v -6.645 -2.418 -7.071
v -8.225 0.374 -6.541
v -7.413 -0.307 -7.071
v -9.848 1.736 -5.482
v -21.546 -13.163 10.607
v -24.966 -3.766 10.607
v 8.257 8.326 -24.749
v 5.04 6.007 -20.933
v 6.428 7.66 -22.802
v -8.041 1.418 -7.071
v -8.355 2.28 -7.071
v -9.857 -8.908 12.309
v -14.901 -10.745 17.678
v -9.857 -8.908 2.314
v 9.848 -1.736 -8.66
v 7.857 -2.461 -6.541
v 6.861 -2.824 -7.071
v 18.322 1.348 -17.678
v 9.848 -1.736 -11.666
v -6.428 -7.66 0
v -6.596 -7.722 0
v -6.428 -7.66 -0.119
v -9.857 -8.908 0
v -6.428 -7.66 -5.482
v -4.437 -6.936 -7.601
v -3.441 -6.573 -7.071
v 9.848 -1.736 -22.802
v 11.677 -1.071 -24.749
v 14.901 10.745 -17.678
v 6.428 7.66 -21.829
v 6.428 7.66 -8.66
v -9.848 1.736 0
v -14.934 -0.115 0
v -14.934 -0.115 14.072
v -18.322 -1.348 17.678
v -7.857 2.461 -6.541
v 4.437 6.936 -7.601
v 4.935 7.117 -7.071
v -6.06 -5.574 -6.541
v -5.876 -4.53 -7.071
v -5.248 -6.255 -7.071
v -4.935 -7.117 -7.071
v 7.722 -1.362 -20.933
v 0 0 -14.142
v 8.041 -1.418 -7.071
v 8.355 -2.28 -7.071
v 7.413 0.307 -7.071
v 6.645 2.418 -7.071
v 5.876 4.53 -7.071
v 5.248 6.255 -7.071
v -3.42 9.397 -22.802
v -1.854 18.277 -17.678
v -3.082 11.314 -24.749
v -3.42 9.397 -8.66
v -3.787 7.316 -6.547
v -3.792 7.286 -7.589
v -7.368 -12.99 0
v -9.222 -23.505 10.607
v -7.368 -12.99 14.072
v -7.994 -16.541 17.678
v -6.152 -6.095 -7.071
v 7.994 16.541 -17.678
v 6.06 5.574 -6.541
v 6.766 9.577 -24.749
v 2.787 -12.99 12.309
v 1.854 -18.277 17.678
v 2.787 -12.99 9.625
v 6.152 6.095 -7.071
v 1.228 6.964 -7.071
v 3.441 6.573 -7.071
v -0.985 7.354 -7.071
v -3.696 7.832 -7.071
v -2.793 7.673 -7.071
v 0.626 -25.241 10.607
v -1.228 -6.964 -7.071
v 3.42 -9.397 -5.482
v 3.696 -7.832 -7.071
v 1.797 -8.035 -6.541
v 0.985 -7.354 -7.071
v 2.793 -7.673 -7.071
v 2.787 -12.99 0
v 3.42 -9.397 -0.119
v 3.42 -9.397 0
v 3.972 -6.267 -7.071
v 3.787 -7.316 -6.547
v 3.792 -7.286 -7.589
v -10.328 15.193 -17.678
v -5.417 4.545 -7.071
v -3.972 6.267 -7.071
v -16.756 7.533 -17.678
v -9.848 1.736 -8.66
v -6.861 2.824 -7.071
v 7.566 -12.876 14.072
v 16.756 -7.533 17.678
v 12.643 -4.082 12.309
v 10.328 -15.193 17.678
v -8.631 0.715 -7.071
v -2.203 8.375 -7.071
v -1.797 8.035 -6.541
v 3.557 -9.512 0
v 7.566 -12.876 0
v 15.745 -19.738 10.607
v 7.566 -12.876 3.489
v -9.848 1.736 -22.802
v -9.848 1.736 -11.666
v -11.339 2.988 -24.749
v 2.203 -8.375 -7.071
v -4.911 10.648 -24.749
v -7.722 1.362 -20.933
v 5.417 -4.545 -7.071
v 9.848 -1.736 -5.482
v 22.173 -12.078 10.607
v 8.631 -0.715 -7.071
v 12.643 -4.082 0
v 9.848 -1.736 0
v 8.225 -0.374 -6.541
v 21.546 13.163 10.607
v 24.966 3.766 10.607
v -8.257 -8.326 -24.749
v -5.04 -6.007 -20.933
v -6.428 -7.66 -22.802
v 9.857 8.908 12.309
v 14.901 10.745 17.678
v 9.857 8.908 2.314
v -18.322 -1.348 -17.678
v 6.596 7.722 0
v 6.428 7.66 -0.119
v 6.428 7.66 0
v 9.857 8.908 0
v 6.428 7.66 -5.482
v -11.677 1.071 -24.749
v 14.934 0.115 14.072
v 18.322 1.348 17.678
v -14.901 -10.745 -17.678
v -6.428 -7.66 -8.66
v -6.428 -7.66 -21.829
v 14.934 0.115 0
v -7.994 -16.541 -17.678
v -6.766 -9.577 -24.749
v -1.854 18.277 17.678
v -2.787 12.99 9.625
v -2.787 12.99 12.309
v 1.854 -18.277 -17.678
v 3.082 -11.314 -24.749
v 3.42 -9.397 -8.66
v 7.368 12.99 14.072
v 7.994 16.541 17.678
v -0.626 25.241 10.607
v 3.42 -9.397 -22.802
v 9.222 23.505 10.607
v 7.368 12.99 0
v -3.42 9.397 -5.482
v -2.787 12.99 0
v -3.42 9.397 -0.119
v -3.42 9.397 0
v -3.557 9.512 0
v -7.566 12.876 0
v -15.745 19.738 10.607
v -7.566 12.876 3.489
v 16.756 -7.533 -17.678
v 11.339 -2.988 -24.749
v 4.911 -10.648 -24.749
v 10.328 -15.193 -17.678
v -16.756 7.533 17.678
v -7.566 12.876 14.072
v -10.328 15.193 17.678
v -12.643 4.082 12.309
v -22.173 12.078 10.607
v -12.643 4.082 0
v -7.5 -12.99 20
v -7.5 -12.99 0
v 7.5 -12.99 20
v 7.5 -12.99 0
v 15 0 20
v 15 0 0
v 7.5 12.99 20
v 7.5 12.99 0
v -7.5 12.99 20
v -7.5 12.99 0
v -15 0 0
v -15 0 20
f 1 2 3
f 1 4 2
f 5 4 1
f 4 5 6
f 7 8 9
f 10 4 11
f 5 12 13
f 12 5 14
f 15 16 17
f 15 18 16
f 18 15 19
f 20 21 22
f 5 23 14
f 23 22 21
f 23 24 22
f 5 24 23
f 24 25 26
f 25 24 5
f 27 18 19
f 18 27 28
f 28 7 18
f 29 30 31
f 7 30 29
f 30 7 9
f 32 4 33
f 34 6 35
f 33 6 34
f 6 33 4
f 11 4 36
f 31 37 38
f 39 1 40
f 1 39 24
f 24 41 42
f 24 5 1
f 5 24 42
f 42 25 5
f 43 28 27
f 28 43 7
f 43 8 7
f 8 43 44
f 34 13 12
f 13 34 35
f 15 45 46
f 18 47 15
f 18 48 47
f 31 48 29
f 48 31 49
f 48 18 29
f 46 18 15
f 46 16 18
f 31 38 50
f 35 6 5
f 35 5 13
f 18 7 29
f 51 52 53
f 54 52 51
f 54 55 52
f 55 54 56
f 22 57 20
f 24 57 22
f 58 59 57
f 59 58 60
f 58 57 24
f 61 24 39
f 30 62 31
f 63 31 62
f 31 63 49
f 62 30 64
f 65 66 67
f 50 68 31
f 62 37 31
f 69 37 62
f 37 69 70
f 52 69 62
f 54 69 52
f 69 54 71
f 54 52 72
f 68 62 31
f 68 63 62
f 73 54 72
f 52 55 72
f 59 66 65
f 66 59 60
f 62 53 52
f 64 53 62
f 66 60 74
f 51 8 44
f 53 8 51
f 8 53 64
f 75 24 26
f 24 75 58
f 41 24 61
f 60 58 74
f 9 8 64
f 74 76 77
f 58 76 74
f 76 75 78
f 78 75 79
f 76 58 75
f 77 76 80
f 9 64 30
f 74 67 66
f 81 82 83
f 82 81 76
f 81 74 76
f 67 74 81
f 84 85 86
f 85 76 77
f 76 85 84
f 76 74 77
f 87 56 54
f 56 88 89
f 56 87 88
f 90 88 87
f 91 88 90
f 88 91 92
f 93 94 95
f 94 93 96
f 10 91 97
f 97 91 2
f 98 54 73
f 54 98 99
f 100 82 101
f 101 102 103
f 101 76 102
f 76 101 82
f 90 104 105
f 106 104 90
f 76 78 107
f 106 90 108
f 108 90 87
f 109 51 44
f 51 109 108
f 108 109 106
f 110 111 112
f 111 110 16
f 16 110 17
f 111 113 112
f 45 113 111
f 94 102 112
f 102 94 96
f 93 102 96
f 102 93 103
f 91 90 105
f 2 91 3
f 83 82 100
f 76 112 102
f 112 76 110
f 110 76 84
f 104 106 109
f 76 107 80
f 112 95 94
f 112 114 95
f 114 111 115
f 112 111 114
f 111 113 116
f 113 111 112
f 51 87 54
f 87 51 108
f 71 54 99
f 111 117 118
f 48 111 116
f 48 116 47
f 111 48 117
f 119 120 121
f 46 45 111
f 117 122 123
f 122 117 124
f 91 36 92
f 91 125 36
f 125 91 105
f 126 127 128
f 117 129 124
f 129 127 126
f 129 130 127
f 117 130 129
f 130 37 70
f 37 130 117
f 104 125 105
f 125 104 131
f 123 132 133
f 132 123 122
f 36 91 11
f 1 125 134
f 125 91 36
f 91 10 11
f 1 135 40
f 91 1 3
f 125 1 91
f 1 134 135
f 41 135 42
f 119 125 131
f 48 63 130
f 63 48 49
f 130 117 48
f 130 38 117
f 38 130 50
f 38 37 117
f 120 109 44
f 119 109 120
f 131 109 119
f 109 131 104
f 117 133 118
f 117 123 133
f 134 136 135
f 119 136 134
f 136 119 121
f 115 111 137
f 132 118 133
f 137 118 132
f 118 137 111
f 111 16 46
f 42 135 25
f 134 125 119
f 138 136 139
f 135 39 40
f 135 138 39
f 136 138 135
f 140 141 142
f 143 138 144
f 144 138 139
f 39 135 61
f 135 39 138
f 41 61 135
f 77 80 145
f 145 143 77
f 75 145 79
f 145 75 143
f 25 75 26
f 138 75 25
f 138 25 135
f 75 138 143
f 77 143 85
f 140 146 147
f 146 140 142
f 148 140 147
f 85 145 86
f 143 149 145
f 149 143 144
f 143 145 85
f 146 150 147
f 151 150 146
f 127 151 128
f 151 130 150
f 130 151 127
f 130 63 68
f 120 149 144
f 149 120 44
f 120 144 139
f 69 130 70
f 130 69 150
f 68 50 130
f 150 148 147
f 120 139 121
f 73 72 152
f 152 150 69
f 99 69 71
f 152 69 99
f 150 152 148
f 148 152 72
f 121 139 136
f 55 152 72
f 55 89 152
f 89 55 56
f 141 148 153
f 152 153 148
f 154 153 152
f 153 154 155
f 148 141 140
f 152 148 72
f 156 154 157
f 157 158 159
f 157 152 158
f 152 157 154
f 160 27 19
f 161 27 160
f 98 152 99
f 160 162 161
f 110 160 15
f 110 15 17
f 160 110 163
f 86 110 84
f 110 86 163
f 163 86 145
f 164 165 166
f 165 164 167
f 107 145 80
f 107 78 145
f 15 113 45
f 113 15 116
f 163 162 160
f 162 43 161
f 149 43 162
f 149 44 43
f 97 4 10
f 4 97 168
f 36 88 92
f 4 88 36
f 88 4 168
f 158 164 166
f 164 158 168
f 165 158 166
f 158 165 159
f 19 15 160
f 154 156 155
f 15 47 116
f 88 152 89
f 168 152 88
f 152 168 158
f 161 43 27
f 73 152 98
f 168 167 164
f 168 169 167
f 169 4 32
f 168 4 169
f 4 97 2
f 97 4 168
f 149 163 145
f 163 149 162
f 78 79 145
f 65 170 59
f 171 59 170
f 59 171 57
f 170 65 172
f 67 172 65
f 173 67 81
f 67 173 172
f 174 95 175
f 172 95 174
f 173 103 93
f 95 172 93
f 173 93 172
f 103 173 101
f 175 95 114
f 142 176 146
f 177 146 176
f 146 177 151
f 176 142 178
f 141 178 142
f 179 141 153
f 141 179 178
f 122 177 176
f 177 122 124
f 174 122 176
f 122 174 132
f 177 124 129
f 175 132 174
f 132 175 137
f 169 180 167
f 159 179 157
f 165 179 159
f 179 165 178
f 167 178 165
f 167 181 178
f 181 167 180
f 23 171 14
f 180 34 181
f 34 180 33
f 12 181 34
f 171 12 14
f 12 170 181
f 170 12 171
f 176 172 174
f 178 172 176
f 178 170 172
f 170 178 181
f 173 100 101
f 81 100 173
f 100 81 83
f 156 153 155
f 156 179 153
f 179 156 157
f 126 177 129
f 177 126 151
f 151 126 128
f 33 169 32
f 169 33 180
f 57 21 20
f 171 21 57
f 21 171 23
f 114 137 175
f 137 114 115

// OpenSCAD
// Turbine Fan Parameters
$fa = 0.5;  // Rendering accuracy for circles
$fs = 2;    // Rendering accuracy for curved surfaces

// Turbine Fan Dimensions
bladeCount = 6;           // Number of blades
bladeLength = 50;         // Length of each blade
bladeWidth = 10;          // Width of each blade
hubRadius = 15;           // Radius of the central hub
hubHeight = 20;           // Height of the central hub

// Blade Parameters
twistAngle = 45;          // Angle of twist for each blade
twistStart = 20;          // Starting point of the blade twist

// Generate Blades
module blade() {
    rotate([0, 0, twistStart])
    rotate([0, twistAngle, 0])
    translate([0, 0, -bladeWidth/2])
    cube([bladeLength, bladeWidth, bladeWidth], center=true);
}

// Generate Turbine Fan
module turbineFan() {
    union() {
        for (i = [0:bladeCount-1]) {
            rotate([0, 0, 360*i/bladeCount])
            blade();
        }
        cylinder(h=hubHeight, r=hubRadius, $fn=6); // Central hub
    }
}

// Render Turbine Fan
turbineFan();
